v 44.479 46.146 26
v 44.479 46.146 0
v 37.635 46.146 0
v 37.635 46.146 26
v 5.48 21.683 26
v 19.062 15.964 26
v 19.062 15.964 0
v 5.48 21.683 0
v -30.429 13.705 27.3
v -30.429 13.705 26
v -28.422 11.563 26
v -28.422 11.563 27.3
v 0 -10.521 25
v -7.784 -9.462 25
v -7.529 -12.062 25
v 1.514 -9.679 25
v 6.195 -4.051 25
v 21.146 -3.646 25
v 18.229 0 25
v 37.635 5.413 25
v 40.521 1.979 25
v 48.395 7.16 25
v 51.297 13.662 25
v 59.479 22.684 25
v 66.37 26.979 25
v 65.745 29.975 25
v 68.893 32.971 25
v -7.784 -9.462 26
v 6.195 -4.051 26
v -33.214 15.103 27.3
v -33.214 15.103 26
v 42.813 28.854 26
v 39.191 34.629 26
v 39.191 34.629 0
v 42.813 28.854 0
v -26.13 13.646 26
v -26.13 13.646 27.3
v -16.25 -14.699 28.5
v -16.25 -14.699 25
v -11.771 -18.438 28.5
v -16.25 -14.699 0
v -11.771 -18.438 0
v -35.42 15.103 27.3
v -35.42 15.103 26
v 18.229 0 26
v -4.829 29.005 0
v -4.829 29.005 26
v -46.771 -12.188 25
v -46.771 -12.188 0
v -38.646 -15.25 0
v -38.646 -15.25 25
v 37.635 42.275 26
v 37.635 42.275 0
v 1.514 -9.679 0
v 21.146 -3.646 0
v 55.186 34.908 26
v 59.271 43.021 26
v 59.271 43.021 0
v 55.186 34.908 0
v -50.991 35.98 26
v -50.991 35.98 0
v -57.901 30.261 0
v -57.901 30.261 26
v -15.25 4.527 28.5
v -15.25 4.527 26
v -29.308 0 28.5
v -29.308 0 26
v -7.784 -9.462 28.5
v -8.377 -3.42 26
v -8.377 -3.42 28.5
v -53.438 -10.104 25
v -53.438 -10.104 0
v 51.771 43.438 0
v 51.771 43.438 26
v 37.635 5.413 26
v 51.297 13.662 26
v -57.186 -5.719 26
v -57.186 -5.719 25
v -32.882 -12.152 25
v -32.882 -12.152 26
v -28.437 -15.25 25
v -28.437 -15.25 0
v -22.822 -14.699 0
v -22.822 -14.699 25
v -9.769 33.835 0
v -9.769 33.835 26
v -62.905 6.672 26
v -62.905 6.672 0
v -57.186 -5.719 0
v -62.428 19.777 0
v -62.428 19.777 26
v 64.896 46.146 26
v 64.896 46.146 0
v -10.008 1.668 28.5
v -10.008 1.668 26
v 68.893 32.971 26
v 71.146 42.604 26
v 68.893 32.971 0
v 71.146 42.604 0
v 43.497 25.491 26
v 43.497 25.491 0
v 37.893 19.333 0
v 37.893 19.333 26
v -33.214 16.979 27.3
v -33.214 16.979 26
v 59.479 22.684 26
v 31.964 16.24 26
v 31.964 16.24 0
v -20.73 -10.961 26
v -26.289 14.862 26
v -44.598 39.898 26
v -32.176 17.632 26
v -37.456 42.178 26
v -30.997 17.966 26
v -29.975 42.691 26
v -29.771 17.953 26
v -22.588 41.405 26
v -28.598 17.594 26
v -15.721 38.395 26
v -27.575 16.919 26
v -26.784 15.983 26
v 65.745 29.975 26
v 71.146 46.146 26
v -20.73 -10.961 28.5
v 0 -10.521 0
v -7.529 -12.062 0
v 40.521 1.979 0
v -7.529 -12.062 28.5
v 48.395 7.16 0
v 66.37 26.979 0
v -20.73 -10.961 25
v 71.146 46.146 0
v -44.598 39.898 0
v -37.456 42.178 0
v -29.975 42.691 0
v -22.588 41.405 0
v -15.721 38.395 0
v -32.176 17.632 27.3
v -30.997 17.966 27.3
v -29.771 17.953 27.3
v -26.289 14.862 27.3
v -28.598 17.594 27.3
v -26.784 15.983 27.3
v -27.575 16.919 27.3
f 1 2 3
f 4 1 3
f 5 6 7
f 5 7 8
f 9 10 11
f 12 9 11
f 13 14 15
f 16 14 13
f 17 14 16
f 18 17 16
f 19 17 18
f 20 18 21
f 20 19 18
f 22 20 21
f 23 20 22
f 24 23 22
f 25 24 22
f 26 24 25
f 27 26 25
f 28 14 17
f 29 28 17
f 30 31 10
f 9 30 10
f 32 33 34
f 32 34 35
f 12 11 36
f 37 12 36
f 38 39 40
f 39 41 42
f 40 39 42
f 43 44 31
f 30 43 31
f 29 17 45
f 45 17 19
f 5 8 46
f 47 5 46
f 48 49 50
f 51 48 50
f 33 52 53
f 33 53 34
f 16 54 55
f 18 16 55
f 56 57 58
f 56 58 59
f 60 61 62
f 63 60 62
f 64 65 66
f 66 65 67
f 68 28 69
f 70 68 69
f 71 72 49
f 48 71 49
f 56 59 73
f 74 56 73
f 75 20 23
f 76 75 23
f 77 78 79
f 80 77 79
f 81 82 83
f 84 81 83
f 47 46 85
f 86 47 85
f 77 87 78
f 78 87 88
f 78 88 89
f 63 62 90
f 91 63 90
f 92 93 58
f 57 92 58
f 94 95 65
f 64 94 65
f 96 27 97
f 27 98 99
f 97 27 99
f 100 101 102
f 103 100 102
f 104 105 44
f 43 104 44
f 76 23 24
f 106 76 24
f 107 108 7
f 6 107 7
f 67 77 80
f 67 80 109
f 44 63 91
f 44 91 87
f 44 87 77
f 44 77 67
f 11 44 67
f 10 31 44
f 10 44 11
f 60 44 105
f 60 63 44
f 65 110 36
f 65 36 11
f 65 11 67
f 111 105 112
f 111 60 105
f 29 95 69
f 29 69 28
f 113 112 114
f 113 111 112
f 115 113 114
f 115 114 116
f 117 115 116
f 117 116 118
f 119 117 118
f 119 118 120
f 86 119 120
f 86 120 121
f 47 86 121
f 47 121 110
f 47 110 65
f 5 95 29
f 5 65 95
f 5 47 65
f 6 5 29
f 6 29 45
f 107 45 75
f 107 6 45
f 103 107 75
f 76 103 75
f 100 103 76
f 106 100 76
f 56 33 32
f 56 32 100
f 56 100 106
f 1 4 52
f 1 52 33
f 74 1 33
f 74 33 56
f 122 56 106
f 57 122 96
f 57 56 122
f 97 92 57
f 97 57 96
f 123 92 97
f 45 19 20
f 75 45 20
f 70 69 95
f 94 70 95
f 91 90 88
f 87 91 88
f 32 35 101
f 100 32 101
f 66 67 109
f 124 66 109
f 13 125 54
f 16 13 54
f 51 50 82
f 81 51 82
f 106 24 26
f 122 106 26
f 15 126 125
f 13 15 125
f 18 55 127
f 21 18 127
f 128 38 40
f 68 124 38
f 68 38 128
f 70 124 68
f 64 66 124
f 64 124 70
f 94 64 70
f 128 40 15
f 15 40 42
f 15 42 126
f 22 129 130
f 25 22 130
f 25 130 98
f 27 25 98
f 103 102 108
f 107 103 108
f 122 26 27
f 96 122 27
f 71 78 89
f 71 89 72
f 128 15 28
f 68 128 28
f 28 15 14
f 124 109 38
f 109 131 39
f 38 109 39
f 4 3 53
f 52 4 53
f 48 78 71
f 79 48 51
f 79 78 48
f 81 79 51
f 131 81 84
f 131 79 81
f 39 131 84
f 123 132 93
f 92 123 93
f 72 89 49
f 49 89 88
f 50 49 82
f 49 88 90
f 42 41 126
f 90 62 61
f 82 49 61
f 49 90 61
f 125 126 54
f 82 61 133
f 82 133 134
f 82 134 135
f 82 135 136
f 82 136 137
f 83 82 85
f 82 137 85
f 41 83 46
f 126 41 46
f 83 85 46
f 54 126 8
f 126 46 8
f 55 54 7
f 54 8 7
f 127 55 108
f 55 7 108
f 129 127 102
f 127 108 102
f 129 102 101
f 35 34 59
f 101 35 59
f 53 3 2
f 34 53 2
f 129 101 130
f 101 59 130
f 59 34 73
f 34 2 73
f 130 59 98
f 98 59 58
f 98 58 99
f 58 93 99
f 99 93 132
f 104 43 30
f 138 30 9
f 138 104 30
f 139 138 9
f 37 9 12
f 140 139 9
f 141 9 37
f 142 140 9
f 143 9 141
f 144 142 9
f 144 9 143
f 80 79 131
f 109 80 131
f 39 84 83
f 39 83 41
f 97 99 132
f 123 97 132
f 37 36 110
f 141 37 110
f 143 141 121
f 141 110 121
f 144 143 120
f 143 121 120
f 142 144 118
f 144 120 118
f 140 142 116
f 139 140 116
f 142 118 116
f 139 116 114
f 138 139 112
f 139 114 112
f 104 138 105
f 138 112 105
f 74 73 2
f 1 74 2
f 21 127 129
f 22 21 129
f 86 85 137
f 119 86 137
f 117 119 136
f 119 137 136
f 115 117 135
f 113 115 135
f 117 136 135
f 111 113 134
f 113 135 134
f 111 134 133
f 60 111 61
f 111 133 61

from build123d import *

# Parameters (mm, degrees)
F1_DEPTH = 28.5
F2_DEPTH = 25
F3_DEPTH = 25
F4_DEPTH = 26
F5_DEPTH = 27.3


with BuildPart() as f1:
    # F0 (on Top) → F1 (new body)
    with BuildSketch(Plane.XY):
        Polygon((-29.307868, 0), (-20.729955, -10.960666), (-8.577912, -9.769289), (-7.784336, -9.462098), (-8.376737, -3.419617), (-10.007564, 1.667927), (-15.249622, 4.527232), align=None)
        Polygon((-8.577912, -9.769289), (-20.729955, -10.960666), (-16.250395, -14.699083), (-11.770834, -18.437501), (-7.529469, -12.061744), (-7.784336, -9.462098), align=None)
    extrude(amount=F1_DEPTH)

    # F0 (on Top) → F2 (join)
    with BuildSketch(Plane.XY):
        Polygon((-32.881998, -12.152042), (-57.186086, -5.718608), (-53.437501, -10.104167), (-46.770833, -12.1875), (-38.645834, -15.249623), (-28.437063, -15.249623), (-22.821563, -14.699083), (-16.250395, -14.699083), (-20.729955, -10.960666), align=None)
    extrude(amount=F2_DEPTH)

    # F0 (on Top) → F3 (join)
    with BuildSketch(Plane.XY):
        Polygon((6.19516, -4.050681), (-7.784336, -9.462098), (-7.529469, -12.061744), (0, -10.520834), (1.51446, -9.679468), (21.145836, -3.645833), (40.520836, 1.979167), (48.395412, 7.15981), (66.369534, 26.979169), (68.892609, 32.971472), (65.744534, 29.97532), (59.47917, 22.684125), (51.297057, 13.662031), (37.635021, 5.413258), (18.229166, 0), align=None)
    extrude(amount=F3_DEPTH)

    # F0 (on Top) → F4 (join)
    with BuildSketch(Plane.XY):
        with BuildLine():
            Line((-4.828904, 29.004751), (-9.769289, 33.835098))
            ThreePointArc((-9.769289, 33.835098), (-29.975189, 42.690738), (-50.990924, 35.97958))
            Line((-50.990924, 35.97958), (-57.900909, 30.260969))
            Line((-57.900909, 30.260969), (-62.428143, 19.776853))
            Line((-62.428143, 19.776853), (-62.904693, 6.671709))
            Line((-62.904693, 6.671709), (-57.186086, -5.718608))
            Line((-57.186086, -5.718608), (-32.881998, -12.152042))
            Line((-32.881998, -12.152042), (-20.729955, -10.960666))
            Line((-20.729955, -10.960666), (-29.307868, 0))
            Line((-29.307868, 0), (-15.249622, 4.527232))
            Line((-15.249622, 4.527232), (-10.007564, 1.667927))
            Line((-10.007564, 1.667927), (-8.376737, -3.419617))
            Line((-8.376737, -3.419617), (-7.784336, -9.462098))
            Line((-7.784336, -9.462098), (6.19516, -4.050681))
            Line((6.19516, -4.050681), (18.229166, 0))
            Line((18.229166, 0), (37.635021, 5.413258))
            Line((37.635021, 5.413258), (51.297057, 13.662031))
            Line((51.297057, 13.662031), (59.47917, 22.684125))
            Line((59.47917, 22.684125), (65.744534, 29.97532))
            Line((65.744534, 29.97532), (68.892609, 32.971472))
            Line((68.892609, 32.971472), (71.14584, 42.604171))
            Line((71.14584, 42.604171), (71.14584, 46.145838))
            Line((71.14584, 46.145838), (64.895838, 46.145838))
            Line((64.895838, 46.145838), (59.270833, 43.020837))
            Line((59.270833, 43.020837), (55.186109, 34.90815))
            Line((55.186109, 34.90815), (51.770836, 43.4375))
            Line((51.770836, 43.4375), (44.479169, 46.145838))
            Line((44.479169, 46.145838), (37.635021, 46.145838))
            Line((37.635021, 46.145838), (37.635021, 42.274959))
            Line((37.635021, 42.274959), (39.190768, 34.62882))
            Line((39.190768, 34.62882), (42.812504, 28.854169))
            Line((42.812504, 28.854169), (43.496898, 25.49053))
            Line((43.496898, 25.49053), (37.8928, 19.333061))
            Line((37.8928, 19.333061), (31.963997, 16.239772))
            Line((31.963997, 16.239772), (19.062029, 15.964448))
            Line((19.062029, 15.964448), (5.480333, 21.683058))
            Line((5.480333, 21.683058), (-4.828904, 29.004751))
        make_face()
        with BuildLine():
            ThreePointArc((-33.213809, 16.979167), (-28.598407, 17.594186), (-26.130475, 13.645833))
            Line((-26.130475, 13.645833), (-28.42214, 11.562501))
            Line((-28.42214, 11.562501), (-30.428787, 13.704629))
            Line((-30.428787, 13.704629), (-33.213809, 15.102518))
            Line((-33.213809, 15.102518), (-35.420312, 15.102518))
            Line((-35.420312, 15.102518), (-33.213809, 16.979167))
        make_face(mode=Mode.SUBTRACT)
    extrude(amount=F4_DEPTH)

    # F0 (on Top) → F5 (join)
    with BuildSketch(Plane.XY):
        with BuildLine():
            Line((-28.42214, 11.562501), (-26.130475, 13.645833))
            ThreePointArc((-26.130475, 13.645833), (-28.598407, 17.594186), (-33.213809, 16.979167))
            Line((-33.213809, 16.979167), (-35.420312, 15.102518))
            Line((-35.420312, 15.102518), (-33.213809, 15.102518))
            Line((-33.213809, 15.102518), (-30.428787, 13.704629))
            Line((-30.428787, 13.704629), (-28.42214, 11.562501))
        make_face()
    extrude(amount=F5_DEPTH)


solid = f1.part
